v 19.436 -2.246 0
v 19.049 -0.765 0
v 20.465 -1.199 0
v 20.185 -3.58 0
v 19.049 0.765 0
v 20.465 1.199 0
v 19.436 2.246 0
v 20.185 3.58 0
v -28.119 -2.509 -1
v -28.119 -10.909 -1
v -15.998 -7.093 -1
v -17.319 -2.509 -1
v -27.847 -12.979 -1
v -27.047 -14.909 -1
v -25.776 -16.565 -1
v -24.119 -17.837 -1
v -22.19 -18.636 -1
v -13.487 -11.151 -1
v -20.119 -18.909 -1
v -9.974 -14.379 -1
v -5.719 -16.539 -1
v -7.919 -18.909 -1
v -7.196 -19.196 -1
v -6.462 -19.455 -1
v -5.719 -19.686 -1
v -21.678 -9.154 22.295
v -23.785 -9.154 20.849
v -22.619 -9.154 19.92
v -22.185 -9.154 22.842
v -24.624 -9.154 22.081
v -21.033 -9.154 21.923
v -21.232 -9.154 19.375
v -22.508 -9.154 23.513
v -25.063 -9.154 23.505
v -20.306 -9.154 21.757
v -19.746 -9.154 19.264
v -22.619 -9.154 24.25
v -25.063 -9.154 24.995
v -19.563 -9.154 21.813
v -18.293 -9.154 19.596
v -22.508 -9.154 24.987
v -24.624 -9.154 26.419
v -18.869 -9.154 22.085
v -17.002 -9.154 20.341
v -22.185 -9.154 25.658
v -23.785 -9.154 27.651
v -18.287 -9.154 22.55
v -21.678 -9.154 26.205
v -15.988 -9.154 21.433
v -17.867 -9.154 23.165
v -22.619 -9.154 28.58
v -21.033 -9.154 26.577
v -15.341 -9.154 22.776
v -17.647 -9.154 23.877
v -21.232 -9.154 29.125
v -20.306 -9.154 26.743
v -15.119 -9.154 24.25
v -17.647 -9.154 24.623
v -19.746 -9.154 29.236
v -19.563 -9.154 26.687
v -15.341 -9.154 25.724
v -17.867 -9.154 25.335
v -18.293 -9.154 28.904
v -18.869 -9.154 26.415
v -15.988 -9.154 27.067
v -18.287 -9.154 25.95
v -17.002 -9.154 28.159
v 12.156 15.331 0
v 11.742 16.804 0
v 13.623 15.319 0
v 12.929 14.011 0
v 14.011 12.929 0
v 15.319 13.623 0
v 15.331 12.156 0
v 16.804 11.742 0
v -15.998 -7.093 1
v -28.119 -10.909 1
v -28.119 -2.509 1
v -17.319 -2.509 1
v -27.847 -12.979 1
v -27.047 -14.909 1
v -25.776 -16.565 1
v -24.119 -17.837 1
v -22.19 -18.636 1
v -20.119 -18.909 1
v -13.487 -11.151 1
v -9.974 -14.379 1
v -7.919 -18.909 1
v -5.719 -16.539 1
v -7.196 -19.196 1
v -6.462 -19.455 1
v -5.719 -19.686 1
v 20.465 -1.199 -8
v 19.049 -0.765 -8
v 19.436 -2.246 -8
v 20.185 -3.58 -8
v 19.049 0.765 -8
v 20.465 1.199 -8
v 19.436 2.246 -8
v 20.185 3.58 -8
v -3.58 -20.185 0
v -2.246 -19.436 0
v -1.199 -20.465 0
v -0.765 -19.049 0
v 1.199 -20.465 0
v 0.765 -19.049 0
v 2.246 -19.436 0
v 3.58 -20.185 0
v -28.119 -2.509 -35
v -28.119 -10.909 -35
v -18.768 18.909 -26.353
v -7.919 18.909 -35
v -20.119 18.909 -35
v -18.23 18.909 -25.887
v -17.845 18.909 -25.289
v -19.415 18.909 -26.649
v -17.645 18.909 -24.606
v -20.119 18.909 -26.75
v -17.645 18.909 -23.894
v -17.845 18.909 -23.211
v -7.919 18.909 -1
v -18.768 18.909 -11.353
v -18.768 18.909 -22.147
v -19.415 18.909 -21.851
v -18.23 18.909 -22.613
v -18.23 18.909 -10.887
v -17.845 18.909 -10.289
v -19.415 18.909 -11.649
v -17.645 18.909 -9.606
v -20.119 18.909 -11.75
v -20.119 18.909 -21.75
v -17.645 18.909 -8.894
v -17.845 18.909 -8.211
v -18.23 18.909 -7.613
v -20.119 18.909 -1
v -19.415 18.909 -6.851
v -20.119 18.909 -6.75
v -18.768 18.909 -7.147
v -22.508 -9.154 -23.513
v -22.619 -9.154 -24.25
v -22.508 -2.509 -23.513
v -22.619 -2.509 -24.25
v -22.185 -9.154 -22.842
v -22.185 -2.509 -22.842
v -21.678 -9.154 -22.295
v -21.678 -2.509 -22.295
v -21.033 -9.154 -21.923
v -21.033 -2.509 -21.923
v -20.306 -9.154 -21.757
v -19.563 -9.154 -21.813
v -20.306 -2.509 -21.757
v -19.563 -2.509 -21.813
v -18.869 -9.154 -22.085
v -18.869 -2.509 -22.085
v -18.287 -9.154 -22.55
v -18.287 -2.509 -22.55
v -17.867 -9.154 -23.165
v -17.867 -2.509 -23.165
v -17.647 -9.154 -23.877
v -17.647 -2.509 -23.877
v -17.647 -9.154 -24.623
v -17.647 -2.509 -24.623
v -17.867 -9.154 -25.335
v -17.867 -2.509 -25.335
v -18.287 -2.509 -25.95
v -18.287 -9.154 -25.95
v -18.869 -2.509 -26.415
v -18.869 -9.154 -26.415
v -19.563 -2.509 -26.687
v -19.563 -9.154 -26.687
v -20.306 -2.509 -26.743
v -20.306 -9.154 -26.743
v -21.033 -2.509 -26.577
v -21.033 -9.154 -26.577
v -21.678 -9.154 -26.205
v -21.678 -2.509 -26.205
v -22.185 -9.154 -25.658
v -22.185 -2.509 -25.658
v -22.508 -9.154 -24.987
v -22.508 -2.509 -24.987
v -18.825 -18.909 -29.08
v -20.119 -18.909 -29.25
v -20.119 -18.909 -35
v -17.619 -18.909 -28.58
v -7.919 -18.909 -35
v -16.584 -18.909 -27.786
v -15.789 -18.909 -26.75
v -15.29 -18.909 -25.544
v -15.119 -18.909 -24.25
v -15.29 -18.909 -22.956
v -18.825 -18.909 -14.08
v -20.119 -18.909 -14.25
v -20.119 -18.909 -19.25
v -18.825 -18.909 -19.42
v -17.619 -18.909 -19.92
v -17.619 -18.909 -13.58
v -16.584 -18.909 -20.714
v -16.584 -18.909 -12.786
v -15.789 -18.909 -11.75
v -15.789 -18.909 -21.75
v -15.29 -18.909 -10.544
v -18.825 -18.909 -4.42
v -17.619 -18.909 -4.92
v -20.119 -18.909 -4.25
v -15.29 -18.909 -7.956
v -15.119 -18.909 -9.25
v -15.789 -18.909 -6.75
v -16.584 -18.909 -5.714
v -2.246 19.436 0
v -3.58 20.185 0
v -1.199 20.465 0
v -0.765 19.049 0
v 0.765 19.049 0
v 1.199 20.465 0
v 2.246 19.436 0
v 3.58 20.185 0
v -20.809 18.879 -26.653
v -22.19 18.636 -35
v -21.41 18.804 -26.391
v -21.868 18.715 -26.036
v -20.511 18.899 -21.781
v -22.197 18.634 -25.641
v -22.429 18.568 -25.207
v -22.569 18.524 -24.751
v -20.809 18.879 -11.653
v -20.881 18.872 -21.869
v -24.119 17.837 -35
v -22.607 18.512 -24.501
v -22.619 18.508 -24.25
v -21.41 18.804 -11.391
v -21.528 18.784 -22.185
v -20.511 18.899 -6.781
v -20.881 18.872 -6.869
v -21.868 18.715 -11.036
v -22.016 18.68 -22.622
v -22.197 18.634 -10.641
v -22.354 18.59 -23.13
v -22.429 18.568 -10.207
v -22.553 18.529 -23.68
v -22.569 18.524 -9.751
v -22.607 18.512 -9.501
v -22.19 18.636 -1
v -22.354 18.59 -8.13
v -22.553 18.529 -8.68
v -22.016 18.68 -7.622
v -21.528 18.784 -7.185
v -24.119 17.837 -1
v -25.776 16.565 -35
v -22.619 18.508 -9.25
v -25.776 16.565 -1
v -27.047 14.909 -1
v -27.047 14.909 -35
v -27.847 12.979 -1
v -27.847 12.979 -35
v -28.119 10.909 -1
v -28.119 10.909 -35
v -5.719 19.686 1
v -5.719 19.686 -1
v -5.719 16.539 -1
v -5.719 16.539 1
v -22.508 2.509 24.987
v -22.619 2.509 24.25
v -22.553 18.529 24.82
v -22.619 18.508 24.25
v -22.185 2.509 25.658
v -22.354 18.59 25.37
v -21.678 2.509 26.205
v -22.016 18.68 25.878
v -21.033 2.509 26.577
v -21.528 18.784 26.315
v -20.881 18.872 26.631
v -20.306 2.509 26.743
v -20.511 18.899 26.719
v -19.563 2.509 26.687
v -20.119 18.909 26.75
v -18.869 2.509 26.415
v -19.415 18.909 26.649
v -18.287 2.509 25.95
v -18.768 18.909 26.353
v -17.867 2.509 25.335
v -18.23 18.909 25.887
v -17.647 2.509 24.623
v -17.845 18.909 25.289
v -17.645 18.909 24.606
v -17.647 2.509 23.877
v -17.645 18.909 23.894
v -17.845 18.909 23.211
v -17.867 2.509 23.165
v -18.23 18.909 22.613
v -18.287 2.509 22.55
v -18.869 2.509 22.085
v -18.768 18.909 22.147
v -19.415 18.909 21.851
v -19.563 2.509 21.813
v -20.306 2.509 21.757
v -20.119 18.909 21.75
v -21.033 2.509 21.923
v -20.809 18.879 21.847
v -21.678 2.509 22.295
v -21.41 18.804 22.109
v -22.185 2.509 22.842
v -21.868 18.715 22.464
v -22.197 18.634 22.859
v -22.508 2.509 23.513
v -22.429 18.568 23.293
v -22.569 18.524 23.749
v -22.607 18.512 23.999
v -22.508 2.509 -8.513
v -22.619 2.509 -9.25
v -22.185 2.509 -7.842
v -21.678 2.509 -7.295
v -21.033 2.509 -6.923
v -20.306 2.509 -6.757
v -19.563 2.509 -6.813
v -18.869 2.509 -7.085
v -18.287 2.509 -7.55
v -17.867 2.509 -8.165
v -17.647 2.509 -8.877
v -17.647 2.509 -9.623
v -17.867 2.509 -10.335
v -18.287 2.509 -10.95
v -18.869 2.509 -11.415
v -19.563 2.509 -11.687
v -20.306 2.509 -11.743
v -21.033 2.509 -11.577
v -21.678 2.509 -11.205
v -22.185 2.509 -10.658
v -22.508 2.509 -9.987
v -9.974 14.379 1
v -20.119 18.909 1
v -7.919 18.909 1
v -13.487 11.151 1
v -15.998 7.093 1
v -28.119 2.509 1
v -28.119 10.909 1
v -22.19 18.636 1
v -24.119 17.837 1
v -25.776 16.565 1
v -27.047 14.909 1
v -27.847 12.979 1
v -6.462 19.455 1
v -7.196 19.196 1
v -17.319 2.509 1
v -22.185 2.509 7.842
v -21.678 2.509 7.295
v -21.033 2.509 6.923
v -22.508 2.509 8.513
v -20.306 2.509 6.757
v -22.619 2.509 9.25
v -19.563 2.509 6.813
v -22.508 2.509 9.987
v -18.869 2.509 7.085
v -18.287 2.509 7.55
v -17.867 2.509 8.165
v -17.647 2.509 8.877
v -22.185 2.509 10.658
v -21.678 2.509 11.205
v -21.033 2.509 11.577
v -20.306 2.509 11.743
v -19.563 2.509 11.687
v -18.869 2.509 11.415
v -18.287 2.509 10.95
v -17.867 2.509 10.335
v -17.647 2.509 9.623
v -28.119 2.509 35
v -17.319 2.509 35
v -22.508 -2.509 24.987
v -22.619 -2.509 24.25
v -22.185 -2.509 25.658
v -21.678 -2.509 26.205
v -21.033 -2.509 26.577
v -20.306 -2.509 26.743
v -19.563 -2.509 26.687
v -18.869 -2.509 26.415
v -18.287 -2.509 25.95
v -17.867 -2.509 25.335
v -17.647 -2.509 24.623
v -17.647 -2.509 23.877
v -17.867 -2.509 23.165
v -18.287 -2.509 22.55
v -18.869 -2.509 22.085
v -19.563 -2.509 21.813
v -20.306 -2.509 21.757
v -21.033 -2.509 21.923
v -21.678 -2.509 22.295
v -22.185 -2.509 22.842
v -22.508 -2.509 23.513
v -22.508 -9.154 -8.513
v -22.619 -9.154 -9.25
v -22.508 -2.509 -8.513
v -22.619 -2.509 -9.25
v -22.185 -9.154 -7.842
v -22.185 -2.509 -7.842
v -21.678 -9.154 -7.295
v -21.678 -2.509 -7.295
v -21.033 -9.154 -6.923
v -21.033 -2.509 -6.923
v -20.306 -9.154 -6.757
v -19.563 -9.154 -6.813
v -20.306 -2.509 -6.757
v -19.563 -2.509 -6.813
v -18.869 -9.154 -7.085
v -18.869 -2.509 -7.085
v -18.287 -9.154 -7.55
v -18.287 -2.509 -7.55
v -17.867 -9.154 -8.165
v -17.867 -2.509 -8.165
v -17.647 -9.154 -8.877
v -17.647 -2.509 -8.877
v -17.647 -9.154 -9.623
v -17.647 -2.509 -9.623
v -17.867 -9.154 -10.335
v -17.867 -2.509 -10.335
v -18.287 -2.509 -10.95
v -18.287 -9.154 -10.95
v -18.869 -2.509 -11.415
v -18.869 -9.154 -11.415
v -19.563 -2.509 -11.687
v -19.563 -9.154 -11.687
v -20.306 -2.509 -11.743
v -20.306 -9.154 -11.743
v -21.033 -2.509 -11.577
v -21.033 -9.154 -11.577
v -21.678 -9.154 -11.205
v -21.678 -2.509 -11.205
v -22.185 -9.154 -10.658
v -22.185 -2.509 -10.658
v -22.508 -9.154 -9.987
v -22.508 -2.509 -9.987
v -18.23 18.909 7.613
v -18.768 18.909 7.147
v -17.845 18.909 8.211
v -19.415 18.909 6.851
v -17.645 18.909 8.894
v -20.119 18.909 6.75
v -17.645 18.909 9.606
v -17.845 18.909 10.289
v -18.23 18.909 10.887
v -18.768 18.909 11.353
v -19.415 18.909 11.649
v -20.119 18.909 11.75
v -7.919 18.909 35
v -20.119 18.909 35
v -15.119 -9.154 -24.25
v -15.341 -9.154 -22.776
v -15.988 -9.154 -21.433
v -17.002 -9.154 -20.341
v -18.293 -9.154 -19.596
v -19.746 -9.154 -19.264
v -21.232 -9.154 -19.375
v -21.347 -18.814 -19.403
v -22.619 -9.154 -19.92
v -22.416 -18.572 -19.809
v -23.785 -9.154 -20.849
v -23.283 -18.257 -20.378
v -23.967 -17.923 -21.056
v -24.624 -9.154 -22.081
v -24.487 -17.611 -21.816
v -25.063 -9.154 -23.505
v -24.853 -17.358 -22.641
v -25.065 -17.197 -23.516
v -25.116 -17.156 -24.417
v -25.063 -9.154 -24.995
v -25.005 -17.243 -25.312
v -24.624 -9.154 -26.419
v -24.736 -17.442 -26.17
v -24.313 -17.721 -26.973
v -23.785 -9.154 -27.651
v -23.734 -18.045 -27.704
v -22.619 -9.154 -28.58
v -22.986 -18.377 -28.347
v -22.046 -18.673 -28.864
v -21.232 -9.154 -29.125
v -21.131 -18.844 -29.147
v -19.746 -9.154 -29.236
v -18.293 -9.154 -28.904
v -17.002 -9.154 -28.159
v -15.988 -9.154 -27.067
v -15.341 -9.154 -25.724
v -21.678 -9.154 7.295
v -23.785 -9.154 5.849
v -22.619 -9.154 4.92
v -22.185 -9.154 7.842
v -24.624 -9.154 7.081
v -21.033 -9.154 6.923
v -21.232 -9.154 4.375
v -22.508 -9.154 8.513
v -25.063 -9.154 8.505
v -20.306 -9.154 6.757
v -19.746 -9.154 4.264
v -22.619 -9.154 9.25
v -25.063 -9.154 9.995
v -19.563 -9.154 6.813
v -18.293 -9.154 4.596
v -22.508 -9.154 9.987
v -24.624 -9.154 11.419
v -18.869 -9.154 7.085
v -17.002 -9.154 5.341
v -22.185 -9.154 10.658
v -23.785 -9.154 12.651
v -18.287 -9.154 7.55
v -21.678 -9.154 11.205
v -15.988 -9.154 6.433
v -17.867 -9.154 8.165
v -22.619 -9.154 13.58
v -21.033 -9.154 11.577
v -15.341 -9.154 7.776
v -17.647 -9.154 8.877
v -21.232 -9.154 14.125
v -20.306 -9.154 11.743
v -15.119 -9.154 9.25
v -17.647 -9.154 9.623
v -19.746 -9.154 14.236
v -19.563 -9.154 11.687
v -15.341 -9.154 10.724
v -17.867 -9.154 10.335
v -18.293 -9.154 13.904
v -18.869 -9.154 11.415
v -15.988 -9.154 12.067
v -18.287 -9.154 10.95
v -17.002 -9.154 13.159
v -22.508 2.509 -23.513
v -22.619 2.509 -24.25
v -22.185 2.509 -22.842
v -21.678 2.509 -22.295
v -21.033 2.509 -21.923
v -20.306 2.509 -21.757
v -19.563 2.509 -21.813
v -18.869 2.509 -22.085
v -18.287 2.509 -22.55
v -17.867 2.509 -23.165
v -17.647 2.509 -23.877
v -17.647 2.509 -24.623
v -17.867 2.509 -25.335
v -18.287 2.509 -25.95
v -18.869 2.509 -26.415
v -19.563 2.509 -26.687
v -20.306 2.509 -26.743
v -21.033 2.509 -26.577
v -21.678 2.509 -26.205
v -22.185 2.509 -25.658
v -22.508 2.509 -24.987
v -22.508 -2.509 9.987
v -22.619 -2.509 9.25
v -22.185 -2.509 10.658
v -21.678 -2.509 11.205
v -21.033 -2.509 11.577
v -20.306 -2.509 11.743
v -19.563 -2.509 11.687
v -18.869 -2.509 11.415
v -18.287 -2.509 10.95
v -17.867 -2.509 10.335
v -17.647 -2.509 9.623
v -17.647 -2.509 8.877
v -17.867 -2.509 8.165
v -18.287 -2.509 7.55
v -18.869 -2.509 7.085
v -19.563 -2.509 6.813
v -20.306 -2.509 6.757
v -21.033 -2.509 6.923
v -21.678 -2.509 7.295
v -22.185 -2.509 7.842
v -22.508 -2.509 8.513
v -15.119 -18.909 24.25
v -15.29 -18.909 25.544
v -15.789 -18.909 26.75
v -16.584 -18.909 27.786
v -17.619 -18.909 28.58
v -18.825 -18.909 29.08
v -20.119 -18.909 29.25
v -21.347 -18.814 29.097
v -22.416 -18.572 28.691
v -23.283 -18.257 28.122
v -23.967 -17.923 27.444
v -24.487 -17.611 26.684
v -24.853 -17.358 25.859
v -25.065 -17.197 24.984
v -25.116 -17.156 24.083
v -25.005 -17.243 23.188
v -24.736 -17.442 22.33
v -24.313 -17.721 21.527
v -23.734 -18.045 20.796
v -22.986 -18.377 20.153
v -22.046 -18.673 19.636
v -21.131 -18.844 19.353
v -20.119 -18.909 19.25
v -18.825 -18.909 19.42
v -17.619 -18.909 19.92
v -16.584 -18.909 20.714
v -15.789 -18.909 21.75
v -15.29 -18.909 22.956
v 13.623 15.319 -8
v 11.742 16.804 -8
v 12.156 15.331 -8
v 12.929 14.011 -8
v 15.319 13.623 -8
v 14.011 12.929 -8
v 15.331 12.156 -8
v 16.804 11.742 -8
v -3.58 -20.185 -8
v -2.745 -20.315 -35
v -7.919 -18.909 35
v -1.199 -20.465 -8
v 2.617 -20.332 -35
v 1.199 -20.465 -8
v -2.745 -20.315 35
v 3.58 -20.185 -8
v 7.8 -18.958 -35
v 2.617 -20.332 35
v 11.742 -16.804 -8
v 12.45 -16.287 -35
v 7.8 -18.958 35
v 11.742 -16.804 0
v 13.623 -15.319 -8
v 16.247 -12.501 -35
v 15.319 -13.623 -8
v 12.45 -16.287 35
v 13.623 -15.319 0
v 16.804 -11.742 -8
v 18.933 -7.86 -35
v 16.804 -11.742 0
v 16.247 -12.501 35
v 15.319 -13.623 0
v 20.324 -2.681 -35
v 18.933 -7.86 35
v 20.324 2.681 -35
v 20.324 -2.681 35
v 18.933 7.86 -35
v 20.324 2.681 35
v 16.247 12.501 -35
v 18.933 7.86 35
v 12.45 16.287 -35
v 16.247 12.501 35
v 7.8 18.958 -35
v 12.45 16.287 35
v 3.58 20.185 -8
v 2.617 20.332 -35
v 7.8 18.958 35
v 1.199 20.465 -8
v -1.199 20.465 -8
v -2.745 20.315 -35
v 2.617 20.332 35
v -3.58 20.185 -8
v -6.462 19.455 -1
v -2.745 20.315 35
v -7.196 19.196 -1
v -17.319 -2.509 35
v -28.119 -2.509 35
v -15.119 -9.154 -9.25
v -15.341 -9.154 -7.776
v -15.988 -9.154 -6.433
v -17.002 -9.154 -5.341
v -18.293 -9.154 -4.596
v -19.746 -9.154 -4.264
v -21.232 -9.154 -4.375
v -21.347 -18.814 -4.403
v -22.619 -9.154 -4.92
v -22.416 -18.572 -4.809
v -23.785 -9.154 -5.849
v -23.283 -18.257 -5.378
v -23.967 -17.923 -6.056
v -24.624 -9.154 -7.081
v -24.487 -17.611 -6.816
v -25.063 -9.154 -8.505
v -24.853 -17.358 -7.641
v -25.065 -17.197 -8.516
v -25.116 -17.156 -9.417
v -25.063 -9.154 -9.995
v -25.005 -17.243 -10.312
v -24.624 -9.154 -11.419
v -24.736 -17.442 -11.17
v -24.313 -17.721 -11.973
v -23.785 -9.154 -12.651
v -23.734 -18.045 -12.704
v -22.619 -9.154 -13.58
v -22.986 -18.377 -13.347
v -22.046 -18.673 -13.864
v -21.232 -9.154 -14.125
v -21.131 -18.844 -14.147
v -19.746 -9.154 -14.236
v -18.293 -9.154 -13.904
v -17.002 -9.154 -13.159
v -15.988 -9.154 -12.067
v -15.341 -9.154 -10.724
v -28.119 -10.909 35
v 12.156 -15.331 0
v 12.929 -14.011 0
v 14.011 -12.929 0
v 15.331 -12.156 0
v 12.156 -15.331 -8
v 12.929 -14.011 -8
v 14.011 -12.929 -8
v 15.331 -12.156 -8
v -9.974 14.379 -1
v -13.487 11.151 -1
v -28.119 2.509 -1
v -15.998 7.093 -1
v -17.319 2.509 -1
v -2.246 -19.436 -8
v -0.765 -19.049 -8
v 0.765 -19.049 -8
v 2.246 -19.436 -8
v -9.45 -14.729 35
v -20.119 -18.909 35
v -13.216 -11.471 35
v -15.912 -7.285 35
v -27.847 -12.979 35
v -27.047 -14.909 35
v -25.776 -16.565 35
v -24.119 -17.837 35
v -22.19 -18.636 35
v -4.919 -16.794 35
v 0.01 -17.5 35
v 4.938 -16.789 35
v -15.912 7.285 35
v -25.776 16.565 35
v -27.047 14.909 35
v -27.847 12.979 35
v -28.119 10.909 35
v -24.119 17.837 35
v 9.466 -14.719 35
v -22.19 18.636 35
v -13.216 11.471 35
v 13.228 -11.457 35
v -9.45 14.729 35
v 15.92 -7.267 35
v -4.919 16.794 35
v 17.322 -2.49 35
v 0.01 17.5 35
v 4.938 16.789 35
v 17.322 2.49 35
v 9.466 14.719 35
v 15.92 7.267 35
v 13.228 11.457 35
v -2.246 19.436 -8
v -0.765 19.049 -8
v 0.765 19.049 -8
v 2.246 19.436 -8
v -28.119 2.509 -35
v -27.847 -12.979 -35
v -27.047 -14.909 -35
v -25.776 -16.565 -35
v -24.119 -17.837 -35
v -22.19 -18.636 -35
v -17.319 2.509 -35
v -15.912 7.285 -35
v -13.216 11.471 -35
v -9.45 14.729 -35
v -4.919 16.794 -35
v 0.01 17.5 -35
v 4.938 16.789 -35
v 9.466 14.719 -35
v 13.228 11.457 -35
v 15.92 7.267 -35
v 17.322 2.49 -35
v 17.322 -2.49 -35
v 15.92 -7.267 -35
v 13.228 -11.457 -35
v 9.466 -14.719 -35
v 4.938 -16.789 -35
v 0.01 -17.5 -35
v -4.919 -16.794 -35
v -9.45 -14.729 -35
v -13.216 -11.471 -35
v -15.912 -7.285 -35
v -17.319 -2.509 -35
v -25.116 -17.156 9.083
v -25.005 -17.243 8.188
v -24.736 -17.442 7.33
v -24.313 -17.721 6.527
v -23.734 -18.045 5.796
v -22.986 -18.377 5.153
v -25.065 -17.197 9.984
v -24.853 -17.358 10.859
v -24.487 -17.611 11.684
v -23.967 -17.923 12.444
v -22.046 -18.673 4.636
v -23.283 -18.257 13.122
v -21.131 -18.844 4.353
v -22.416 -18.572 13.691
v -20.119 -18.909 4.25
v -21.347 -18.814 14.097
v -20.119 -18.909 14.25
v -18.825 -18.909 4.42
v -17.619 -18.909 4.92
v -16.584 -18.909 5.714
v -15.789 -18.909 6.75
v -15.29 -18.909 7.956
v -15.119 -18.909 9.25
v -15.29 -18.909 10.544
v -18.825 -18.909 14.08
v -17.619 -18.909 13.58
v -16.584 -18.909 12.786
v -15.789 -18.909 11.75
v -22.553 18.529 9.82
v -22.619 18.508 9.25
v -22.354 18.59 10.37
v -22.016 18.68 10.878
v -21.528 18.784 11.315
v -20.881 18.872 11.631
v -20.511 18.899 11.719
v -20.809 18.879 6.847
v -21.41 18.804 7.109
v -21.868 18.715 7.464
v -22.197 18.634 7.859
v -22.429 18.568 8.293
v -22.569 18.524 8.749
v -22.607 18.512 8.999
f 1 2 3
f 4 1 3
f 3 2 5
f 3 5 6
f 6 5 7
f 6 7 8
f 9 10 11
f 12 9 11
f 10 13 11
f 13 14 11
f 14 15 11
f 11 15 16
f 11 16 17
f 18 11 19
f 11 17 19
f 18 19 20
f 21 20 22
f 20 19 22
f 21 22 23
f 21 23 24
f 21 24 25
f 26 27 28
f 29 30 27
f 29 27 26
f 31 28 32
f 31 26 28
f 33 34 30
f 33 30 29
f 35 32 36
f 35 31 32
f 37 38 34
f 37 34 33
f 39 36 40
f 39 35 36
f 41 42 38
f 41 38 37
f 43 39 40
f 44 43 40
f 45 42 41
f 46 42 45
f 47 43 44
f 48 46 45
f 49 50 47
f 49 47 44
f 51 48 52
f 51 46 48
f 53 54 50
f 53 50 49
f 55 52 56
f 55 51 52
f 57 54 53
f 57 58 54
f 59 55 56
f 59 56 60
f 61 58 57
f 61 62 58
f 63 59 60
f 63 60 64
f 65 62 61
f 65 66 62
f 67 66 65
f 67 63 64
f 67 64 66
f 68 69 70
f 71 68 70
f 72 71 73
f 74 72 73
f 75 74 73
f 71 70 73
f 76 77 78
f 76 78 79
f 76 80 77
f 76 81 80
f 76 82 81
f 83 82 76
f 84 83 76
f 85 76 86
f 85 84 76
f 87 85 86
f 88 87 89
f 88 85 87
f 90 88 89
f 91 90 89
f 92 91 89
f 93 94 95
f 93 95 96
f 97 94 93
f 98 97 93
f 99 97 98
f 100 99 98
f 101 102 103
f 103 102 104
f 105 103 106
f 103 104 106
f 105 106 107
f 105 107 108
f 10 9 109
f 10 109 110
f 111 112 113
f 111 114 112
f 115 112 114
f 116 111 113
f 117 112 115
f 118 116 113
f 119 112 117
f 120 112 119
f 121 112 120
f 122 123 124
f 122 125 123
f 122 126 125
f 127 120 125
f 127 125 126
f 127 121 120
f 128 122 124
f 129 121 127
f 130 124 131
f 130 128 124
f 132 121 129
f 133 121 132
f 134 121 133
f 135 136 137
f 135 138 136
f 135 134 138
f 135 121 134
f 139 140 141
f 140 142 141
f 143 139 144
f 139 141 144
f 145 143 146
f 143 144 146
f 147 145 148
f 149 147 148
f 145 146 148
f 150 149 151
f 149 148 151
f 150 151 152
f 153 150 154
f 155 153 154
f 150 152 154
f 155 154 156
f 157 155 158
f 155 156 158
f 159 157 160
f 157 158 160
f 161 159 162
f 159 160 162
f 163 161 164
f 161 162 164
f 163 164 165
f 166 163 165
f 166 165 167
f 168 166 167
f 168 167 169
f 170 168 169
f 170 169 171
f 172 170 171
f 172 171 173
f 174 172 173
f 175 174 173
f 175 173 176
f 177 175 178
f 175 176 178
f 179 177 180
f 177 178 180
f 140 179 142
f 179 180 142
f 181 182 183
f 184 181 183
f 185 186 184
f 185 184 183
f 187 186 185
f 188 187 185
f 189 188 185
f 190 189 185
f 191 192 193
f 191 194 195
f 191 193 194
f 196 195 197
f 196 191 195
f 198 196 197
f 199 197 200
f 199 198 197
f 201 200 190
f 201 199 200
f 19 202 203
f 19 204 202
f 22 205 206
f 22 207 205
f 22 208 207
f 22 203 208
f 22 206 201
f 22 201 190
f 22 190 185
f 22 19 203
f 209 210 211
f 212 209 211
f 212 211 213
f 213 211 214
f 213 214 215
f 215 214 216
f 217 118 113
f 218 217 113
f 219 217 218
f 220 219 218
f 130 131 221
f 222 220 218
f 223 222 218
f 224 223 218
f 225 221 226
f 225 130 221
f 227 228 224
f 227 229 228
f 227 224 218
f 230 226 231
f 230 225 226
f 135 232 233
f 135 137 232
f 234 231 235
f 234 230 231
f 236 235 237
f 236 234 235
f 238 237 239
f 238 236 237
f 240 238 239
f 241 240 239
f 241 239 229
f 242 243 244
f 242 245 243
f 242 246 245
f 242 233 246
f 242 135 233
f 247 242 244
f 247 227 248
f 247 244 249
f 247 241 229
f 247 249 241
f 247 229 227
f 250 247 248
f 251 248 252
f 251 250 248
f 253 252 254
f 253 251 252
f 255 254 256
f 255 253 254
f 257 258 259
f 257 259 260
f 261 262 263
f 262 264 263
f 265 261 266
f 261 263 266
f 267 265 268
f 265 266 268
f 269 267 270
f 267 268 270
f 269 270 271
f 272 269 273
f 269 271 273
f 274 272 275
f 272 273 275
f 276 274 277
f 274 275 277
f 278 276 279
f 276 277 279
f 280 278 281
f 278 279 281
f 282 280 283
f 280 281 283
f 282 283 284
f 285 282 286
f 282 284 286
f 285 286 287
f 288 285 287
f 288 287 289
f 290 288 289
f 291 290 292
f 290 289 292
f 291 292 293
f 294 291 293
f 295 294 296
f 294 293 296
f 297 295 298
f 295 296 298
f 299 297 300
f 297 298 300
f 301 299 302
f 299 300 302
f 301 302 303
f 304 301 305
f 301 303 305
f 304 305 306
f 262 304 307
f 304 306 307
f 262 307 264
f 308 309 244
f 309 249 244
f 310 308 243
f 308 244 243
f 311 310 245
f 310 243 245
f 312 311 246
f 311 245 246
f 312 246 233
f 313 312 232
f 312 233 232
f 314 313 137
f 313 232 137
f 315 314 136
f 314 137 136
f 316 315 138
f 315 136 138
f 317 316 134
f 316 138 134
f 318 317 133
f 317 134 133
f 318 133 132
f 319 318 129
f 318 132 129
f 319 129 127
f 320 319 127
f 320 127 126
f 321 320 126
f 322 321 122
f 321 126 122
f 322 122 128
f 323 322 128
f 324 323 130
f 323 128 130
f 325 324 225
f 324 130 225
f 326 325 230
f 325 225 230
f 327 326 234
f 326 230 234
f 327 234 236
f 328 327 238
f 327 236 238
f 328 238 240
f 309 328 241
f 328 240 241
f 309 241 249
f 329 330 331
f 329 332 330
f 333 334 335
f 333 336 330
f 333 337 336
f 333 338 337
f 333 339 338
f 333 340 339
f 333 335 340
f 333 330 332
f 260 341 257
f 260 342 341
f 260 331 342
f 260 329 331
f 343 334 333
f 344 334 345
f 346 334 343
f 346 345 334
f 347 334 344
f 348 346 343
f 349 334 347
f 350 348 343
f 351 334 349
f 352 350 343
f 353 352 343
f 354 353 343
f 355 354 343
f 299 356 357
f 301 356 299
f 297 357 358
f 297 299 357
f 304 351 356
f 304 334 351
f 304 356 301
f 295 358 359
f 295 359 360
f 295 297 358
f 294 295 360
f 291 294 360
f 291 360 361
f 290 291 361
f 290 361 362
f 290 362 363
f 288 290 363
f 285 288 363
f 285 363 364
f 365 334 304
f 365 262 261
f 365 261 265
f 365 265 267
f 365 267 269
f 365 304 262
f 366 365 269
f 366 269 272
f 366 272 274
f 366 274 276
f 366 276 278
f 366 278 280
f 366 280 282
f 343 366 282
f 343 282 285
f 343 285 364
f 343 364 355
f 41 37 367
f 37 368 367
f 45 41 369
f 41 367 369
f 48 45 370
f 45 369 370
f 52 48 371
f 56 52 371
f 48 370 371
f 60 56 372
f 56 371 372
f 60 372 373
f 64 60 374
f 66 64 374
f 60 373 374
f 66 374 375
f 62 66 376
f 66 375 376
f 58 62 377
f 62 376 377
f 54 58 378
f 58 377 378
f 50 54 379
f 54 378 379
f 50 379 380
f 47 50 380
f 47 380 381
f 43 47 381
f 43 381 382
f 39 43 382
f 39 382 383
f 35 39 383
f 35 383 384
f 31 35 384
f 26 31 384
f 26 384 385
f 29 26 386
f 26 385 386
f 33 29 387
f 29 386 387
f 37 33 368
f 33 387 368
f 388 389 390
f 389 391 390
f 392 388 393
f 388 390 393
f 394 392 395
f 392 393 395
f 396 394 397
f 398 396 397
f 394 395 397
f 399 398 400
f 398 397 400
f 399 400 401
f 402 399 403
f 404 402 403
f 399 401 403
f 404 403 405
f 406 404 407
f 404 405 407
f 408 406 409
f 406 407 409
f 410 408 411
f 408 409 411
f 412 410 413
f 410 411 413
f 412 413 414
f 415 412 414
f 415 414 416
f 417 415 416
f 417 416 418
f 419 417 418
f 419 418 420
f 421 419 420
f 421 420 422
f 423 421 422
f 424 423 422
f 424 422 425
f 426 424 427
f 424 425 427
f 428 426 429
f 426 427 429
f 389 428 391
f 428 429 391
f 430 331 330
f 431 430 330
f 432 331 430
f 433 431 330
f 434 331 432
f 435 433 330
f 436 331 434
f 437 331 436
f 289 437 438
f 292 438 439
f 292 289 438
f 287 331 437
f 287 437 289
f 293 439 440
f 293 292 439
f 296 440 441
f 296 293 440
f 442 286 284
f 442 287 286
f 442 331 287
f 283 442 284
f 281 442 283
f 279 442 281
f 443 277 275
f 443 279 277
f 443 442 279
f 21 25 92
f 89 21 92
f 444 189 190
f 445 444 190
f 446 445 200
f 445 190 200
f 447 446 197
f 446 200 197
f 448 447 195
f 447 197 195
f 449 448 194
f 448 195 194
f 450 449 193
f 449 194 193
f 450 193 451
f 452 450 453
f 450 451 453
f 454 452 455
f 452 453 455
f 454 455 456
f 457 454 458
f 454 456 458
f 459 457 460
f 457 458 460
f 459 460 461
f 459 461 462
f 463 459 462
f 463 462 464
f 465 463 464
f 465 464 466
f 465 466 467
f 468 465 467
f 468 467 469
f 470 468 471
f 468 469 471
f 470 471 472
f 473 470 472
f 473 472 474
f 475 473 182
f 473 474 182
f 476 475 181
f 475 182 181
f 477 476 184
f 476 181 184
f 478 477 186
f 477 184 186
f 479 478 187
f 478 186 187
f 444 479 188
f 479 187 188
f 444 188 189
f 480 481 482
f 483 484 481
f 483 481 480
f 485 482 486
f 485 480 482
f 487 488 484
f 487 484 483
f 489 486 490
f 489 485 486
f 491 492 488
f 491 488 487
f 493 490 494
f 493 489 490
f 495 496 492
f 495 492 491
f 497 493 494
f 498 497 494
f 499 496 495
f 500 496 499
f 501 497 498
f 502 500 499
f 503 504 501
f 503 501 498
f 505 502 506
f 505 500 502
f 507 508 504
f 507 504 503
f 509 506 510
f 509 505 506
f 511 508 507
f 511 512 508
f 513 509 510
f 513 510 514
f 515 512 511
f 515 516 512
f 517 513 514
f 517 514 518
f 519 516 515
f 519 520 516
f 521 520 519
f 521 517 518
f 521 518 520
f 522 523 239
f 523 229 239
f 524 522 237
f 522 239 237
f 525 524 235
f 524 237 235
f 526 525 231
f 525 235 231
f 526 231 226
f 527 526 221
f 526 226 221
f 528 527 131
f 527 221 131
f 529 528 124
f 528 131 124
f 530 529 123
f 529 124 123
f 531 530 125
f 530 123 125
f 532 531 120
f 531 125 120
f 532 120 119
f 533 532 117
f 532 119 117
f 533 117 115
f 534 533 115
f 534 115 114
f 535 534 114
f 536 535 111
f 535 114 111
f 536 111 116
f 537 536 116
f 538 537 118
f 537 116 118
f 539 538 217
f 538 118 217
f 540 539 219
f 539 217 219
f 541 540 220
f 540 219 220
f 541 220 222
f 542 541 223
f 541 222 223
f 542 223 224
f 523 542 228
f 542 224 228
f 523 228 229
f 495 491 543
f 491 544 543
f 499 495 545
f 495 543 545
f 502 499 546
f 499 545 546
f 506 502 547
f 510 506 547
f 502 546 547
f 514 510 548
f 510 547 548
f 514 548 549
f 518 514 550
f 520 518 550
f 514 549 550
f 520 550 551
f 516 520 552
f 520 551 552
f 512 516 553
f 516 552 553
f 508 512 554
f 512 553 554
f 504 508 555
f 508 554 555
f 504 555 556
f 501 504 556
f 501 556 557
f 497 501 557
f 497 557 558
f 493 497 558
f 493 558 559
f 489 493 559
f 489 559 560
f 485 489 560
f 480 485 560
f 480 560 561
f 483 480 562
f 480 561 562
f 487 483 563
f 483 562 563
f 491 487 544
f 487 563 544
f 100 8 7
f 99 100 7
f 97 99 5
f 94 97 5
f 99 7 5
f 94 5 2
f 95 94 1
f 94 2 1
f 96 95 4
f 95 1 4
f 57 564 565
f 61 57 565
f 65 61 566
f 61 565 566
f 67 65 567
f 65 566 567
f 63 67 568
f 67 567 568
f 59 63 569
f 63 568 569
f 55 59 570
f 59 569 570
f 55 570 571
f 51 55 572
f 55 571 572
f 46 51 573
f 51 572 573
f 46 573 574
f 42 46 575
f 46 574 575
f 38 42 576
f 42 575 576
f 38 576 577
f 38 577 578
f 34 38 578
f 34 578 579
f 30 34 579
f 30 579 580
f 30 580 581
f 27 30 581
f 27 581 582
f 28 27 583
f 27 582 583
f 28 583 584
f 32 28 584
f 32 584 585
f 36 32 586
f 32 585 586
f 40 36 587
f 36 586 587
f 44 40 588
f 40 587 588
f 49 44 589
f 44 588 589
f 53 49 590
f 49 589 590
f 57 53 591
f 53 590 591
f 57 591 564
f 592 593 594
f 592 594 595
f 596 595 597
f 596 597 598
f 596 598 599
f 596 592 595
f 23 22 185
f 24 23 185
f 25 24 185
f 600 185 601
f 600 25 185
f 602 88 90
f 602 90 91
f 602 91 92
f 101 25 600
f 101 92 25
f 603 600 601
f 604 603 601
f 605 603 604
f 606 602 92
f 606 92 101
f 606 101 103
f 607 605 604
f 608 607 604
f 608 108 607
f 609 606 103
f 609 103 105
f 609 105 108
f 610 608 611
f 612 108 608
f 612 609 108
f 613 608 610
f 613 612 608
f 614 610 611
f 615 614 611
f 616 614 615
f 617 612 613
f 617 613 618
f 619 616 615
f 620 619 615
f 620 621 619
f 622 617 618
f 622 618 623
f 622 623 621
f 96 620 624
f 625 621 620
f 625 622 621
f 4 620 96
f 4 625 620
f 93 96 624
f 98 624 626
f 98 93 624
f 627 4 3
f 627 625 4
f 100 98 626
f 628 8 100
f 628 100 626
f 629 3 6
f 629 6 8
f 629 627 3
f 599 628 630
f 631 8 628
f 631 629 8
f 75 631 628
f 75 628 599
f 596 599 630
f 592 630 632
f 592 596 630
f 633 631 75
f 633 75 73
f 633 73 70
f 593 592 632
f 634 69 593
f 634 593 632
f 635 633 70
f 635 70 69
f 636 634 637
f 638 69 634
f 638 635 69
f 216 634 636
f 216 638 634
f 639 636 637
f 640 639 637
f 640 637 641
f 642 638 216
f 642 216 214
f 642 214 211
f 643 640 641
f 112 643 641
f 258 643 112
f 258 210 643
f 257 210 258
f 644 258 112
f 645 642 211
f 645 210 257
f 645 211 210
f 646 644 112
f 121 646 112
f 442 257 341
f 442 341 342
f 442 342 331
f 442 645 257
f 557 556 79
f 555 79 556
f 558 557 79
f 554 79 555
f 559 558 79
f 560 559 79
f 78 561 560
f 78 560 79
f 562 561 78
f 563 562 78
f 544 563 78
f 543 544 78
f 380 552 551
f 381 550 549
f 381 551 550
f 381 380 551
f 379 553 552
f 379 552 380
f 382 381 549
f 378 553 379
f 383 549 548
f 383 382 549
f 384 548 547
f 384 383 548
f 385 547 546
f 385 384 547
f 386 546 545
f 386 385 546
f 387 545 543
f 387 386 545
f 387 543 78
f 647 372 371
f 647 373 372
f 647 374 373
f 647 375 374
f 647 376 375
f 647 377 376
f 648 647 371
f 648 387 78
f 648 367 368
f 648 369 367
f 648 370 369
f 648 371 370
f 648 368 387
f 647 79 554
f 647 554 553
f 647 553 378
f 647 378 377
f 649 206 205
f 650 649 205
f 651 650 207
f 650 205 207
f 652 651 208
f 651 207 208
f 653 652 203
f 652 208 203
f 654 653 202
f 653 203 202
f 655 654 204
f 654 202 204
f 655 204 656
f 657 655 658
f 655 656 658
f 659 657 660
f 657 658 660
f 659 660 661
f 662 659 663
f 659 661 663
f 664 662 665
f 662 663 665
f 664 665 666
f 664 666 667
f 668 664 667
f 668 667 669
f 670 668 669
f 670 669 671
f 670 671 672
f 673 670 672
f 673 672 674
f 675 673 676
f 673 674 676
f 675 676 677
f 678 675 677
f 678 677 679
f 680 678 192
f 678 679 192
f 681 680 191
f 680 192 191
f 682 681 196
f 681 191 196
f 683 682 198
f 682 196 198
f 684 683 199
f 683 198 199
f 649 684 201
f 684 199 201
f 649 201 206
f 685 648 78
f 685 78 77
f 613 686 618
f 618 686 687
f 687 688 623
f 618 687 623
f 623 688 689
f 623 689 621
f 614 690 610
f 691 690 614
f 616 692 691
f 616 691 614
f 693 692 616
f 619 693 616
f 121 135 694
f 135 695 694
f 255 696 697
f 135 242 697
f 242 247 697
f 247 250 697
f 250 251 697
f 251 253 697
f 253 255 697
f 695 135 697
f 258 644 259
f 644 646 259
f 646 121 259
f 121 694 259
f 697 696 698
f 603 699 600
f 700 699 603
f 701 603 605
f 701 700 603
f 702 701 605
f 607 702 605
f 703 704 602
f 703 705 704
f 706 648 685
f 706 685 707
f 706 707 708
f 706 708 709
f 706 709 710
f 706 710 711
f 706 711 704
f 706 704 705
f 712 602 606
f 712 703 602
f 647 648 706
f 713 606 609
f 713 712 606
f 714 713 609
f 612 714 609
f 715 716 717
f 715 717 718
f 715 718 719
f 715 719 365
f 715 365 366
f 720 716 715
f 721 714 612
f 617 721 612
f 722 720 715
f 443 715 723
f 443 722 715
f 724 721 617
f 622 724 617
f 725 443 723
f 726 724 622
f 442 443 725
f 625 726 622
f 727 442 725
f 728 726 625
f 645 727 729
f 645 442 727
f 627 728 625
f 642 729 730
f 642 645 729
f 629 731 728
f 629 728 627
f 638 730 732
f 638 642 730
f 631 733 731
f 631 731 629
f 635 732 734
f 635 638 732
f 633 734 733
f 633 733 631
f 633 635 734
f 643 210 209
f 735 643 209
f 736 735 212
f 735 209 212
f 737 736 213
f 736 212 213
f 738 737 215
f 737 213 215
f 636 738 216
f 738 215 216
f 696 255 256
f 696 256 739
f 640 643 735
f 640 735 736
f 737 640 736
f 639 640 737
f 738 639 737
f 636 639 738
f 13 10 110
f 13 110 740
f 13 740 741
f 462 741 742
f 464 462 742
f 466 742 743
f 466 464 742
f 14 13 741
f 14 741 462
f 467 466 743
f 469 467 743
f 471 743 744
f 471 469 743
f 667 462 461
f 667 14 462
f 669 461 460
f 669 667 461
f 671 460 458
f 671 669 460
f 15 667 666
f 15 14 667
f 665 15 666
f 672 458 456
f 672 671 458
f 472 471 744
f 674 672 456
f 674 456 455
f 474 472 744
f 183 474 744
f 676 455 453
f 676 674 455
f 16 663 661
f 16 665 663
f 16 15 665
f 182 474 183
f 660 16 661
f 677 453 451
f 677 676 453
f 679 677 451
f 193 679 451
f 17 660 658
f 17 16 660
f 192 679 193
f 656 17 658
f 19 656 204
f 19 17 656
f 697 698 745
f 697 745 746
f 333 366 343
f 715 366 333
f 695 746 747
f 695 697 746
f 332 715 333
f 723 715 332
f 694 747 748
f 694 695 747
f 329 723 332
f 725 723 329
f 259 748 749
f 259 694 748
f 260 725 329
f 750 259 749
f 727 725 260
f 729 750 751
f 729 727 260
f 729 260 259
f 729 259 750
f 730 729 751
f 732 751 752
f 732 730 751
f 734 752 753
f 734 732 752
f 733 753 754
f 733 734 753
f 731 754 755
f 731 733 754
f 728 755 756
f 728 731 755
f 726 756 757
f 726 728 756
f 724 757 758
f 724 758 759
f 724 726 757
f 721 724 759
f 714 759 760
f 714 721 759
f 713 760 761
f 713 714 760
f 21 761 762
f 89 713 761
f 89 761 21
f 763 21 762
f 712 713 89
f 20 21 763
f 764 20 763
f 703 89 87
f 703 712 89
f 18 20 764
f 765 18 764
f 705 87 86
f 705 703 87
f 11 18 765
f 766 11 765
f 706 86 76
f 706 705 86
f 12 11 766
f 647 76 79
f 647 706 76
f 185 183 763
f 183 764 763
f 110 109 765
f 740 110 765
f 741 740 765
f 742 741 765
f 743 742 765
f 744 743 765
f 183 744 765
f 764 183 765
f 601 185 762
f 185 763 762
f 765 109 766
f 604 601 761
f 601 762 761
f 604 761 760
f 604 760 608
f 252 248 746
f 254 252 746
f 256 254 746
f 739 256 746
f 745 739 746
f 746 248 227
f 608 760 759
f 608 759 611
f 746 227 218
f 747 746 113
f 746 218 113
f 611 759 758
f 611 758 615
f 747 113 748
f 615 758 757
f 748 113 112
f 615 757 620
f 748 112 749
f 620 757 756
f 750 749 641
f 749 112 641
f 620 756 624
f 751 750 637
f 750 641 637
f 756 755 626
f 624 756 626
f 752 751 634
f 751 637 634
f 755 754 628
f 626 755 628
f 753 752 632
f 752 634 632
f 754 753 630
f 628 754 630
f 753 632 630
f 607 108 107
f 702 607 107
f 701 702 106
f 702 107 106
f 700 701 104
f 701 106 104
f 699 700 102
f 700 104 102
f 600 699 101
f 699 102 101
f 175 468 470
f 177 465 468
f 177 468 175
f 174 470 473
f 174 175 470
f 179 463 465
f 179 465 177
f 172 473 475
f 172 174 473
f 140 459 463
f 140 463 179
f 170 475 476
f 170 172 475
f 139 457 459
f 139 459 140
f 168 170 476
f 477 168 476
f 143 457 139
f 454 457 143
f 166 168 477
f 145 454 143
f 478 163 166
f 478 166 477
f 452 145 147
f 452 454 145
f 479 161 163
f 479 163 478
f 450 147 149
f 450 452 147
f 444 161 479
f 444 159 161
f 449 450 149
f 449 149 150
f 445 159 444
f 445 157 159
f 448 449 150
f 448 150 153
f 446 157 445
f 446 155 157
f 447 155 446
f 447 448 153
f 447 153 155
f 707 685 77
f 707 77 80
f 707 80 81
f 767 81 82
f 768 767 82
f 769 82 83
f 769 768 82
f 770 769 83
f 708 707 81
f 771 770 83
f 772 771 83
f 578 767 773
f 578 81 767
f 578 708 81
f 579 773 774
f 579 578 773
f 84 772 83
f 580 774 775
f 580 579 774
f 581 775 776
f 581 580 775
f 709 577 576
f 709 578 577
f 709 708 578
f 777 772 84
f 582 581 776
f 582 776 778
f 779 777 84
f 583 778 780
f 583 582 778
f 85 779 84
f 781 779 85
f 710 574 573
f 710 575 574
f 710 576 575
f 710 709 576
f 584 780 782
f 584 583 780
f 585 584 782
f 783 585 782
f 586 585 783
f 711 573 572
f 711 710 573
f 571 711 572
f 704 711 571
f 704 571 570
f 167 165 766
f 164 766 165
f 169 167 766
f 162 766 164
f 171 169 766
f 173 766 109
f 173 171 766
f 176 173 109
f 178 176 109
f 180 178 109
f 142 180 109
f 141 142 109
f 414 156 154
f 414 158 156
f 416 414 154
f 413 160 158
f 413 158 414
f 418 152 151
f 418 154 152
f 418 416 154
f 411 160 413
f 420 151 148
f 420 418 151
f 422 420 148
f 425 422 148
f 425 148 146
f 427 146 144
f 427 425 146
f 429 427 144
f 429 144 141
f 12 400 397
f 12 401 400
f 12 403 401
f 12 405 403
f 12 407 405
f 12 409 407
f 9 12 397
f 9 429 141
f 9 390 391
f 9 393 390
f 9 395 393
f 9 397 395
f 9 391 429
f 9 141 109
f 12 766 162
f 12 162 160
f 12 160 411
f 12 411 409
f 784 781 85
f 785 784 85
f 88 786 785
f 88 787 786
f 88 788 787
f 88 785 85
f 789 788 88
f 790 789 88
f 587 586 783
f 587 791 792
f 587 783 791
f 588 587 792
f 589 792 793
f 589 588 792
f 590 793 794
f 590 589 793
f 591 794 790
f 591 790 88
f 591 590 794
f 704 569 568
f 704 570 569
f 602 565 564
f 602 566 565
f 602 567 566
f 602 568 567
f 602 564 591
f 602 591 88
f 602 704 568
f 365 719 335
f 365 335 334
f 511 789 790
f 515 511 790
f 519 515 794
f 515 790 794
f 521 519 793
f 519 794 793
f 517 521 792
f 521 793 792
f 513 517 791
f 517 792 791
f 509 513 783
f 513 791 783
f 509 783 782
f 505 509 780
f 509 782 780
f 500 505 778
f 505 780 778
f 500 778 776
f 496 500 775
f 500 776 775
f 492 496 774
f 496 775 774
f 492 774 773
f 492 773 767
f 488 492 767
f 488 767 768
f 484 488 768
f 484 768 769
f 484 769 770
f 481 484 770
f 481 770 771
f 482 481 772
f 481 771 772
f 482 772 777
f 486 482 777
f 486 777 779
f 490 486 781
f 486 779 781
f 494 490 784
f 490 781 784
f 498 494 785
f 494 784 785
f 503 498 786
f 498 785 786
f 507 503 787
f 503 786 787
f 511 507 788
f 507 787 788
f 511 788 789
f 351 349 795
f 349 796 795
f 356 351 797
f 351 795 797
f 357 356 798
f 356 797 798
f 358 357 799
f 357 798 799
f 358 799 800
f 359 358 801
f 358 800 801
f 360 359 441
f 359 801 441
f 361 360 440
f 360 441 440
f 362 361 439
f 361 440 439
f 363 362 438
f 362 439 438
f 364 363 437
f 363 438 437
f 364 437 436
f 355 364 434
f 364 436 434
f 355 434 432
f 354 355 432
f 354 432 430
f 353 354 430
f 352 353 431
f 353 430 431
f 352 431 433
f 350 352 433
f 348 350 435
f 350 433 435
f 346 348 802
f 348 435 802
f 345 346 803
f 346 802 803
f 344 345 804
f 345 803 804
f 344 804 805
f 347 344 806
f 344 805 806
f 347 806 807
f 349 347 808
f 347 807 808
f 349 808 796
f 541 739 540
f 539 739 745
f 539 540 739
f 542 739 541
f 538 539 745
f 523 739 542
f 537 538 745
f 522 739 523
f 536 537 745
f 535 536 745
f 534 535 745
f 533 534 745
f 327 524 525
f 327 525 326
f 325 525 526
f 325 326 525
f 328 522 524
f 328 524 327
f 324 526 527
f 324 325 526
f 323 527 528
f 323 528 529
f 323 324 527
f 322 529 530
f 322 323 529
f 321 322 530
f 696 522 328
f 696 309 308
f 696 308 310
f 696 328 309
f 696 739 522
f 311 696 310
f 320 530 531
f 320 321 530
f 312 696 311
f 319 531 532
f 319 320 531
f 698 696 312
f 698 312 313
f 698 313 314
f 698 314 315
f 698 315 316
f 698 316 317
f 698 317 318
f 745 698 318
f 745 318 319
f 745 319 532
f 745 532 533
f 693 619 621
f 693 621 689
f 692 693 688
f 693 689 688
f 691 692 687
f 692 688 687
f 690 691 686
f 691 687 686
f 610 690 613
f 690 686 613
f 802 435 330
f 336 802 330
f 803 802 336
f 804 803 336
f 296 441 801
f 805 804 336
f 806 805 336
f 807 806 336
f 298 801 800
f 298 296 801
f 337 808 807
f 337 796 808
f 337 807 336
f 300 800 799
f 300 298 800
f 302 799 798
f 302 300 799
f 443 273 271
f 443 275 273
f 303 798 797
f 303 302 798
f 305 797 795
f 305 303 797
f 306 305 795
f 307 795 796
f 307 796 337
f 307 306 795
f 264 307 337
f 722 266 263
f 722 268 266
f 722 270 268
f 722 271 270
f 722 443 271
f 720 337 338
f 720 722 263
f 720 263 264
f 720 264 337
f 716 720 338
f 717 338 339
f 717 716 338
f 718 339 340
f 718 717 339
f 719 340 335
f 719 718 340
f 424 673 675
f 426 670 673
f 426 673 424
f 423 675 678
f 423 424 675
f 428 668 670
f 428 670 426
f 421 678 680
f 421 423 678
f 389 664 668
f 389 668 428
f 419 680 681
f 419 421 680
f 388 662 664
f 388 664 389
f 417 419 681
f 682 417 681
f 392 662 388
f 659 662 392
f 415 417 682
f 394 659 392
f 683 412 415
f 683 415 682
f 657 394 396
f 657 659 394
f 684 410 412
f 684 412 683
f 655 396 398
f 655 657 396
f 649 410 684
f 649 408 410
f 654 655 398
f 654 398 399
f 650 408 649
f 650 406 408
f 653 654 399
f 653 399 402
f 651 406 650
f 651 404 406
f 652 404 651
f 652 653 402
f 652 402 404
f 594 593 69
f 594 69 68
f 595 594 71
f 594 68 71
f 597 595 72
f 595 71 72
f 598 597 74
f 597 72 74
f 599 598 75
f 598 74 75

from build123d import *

# Parameters (mm, degrees)
F1_DEPTH       = 35
F3_D           = 5
F3_START       = 1.7550021
F3_CBORE_D     = 10
F3_CBORE_DEPTH = 8
F4_W           = 22.4
F4_H           = 2
F5_DEPTH       = 25
F6_R           = 6
F7_DEPTH       = 8


with BuildPart() as f1:
    # F0 (on Top) → F1 (new body, symmetric)
    with BuildSketch(Plane.XY):
        with BuildLine():
            ThreePointArc((-17.3192642082, 2.5086026559), (17.5, 0), (-17.3192642082, -2.5086026559))
            Line((-17.3192642082, -2.5086026559), (-28.1192642082, -2.5086026559))
            Line((-28.1192642082, -2.5086026559), (-28.1192642082, -10.9086026559))
            ThreePointArc((-28.1192642082, -10.9086026559), (-25.7761184577, -16.5654569054), (-20.1192642082, -18.9086026559))
            Line((-20.1192642082, -18.9086026559), (-7.9192642082, -18.9086026559))
            ThreePointArc((-7.9192642082, -18.9086026559), (20.5, 0), (-7.9192642082, 18.9086026559))
            Line((-7.9192642082, 18.9086026559), (-20.1192642082, 18.9086026559))
            ThreePointArc((-20.1192642082, 18.9086026559), (-25.7761184577, 16.5654569054), (-28.1192642082, 10.9086026559))
            Line((-28.1192642082, 10.9086026559), (-28.1192642082, 2.5086026559))
            Line((-28.1192642082, 2.5086026559), (-17.3192642082, 2.5086026559))
        make_face()
    extrude(amount=F1_DEPTH, both=True)

    # F3 (through all)
    # its depths count from where the whole tool has entered the part; down to there all is cleared
    with Locations(Plane.XZ.offset(18.9086026559).offset(-F3_START)):
        with Locations((-20.1192642082, -24.25), (-20.1192642082, -9.25), (-20.1192642082, 9.25), (-20.1192642082, 24.25)):
            CounterBoreHole(F3_D / 2, F3_CBORE_D / 2, F3_CBORE_DEPTH)

    # F4 (on Front) → F5 (cut, symmetric)
    with BuildSketch(Plane.XZ):
        with Locations((-16.9192642082, 0)):
            Rectangle(F4_W, F4_H)
    extrude(amount=F5_DEPTH, both=True, mode=Mode.SUBTRACT)

    # F6 (on Top) → F7 (cut)
    with BuildSketch(Plane.XY):
        with Locations((0, -25)):
            Circle(F6_R)
        with Locations((17.6776695297, -17.6776695297)):
            Circle(F6_R)
        with Locations((25, 0)):
            Circle(F6_R)
        with Locations((17.6776695297, 17.6776695297)):
            Circle(F6_R)
        with Locations((0, 25)):
            Circle(F6_R)
    extrude(amount=-F7_DEPTH, mode=Mode.SUBTRACT)


solid = f1.part
